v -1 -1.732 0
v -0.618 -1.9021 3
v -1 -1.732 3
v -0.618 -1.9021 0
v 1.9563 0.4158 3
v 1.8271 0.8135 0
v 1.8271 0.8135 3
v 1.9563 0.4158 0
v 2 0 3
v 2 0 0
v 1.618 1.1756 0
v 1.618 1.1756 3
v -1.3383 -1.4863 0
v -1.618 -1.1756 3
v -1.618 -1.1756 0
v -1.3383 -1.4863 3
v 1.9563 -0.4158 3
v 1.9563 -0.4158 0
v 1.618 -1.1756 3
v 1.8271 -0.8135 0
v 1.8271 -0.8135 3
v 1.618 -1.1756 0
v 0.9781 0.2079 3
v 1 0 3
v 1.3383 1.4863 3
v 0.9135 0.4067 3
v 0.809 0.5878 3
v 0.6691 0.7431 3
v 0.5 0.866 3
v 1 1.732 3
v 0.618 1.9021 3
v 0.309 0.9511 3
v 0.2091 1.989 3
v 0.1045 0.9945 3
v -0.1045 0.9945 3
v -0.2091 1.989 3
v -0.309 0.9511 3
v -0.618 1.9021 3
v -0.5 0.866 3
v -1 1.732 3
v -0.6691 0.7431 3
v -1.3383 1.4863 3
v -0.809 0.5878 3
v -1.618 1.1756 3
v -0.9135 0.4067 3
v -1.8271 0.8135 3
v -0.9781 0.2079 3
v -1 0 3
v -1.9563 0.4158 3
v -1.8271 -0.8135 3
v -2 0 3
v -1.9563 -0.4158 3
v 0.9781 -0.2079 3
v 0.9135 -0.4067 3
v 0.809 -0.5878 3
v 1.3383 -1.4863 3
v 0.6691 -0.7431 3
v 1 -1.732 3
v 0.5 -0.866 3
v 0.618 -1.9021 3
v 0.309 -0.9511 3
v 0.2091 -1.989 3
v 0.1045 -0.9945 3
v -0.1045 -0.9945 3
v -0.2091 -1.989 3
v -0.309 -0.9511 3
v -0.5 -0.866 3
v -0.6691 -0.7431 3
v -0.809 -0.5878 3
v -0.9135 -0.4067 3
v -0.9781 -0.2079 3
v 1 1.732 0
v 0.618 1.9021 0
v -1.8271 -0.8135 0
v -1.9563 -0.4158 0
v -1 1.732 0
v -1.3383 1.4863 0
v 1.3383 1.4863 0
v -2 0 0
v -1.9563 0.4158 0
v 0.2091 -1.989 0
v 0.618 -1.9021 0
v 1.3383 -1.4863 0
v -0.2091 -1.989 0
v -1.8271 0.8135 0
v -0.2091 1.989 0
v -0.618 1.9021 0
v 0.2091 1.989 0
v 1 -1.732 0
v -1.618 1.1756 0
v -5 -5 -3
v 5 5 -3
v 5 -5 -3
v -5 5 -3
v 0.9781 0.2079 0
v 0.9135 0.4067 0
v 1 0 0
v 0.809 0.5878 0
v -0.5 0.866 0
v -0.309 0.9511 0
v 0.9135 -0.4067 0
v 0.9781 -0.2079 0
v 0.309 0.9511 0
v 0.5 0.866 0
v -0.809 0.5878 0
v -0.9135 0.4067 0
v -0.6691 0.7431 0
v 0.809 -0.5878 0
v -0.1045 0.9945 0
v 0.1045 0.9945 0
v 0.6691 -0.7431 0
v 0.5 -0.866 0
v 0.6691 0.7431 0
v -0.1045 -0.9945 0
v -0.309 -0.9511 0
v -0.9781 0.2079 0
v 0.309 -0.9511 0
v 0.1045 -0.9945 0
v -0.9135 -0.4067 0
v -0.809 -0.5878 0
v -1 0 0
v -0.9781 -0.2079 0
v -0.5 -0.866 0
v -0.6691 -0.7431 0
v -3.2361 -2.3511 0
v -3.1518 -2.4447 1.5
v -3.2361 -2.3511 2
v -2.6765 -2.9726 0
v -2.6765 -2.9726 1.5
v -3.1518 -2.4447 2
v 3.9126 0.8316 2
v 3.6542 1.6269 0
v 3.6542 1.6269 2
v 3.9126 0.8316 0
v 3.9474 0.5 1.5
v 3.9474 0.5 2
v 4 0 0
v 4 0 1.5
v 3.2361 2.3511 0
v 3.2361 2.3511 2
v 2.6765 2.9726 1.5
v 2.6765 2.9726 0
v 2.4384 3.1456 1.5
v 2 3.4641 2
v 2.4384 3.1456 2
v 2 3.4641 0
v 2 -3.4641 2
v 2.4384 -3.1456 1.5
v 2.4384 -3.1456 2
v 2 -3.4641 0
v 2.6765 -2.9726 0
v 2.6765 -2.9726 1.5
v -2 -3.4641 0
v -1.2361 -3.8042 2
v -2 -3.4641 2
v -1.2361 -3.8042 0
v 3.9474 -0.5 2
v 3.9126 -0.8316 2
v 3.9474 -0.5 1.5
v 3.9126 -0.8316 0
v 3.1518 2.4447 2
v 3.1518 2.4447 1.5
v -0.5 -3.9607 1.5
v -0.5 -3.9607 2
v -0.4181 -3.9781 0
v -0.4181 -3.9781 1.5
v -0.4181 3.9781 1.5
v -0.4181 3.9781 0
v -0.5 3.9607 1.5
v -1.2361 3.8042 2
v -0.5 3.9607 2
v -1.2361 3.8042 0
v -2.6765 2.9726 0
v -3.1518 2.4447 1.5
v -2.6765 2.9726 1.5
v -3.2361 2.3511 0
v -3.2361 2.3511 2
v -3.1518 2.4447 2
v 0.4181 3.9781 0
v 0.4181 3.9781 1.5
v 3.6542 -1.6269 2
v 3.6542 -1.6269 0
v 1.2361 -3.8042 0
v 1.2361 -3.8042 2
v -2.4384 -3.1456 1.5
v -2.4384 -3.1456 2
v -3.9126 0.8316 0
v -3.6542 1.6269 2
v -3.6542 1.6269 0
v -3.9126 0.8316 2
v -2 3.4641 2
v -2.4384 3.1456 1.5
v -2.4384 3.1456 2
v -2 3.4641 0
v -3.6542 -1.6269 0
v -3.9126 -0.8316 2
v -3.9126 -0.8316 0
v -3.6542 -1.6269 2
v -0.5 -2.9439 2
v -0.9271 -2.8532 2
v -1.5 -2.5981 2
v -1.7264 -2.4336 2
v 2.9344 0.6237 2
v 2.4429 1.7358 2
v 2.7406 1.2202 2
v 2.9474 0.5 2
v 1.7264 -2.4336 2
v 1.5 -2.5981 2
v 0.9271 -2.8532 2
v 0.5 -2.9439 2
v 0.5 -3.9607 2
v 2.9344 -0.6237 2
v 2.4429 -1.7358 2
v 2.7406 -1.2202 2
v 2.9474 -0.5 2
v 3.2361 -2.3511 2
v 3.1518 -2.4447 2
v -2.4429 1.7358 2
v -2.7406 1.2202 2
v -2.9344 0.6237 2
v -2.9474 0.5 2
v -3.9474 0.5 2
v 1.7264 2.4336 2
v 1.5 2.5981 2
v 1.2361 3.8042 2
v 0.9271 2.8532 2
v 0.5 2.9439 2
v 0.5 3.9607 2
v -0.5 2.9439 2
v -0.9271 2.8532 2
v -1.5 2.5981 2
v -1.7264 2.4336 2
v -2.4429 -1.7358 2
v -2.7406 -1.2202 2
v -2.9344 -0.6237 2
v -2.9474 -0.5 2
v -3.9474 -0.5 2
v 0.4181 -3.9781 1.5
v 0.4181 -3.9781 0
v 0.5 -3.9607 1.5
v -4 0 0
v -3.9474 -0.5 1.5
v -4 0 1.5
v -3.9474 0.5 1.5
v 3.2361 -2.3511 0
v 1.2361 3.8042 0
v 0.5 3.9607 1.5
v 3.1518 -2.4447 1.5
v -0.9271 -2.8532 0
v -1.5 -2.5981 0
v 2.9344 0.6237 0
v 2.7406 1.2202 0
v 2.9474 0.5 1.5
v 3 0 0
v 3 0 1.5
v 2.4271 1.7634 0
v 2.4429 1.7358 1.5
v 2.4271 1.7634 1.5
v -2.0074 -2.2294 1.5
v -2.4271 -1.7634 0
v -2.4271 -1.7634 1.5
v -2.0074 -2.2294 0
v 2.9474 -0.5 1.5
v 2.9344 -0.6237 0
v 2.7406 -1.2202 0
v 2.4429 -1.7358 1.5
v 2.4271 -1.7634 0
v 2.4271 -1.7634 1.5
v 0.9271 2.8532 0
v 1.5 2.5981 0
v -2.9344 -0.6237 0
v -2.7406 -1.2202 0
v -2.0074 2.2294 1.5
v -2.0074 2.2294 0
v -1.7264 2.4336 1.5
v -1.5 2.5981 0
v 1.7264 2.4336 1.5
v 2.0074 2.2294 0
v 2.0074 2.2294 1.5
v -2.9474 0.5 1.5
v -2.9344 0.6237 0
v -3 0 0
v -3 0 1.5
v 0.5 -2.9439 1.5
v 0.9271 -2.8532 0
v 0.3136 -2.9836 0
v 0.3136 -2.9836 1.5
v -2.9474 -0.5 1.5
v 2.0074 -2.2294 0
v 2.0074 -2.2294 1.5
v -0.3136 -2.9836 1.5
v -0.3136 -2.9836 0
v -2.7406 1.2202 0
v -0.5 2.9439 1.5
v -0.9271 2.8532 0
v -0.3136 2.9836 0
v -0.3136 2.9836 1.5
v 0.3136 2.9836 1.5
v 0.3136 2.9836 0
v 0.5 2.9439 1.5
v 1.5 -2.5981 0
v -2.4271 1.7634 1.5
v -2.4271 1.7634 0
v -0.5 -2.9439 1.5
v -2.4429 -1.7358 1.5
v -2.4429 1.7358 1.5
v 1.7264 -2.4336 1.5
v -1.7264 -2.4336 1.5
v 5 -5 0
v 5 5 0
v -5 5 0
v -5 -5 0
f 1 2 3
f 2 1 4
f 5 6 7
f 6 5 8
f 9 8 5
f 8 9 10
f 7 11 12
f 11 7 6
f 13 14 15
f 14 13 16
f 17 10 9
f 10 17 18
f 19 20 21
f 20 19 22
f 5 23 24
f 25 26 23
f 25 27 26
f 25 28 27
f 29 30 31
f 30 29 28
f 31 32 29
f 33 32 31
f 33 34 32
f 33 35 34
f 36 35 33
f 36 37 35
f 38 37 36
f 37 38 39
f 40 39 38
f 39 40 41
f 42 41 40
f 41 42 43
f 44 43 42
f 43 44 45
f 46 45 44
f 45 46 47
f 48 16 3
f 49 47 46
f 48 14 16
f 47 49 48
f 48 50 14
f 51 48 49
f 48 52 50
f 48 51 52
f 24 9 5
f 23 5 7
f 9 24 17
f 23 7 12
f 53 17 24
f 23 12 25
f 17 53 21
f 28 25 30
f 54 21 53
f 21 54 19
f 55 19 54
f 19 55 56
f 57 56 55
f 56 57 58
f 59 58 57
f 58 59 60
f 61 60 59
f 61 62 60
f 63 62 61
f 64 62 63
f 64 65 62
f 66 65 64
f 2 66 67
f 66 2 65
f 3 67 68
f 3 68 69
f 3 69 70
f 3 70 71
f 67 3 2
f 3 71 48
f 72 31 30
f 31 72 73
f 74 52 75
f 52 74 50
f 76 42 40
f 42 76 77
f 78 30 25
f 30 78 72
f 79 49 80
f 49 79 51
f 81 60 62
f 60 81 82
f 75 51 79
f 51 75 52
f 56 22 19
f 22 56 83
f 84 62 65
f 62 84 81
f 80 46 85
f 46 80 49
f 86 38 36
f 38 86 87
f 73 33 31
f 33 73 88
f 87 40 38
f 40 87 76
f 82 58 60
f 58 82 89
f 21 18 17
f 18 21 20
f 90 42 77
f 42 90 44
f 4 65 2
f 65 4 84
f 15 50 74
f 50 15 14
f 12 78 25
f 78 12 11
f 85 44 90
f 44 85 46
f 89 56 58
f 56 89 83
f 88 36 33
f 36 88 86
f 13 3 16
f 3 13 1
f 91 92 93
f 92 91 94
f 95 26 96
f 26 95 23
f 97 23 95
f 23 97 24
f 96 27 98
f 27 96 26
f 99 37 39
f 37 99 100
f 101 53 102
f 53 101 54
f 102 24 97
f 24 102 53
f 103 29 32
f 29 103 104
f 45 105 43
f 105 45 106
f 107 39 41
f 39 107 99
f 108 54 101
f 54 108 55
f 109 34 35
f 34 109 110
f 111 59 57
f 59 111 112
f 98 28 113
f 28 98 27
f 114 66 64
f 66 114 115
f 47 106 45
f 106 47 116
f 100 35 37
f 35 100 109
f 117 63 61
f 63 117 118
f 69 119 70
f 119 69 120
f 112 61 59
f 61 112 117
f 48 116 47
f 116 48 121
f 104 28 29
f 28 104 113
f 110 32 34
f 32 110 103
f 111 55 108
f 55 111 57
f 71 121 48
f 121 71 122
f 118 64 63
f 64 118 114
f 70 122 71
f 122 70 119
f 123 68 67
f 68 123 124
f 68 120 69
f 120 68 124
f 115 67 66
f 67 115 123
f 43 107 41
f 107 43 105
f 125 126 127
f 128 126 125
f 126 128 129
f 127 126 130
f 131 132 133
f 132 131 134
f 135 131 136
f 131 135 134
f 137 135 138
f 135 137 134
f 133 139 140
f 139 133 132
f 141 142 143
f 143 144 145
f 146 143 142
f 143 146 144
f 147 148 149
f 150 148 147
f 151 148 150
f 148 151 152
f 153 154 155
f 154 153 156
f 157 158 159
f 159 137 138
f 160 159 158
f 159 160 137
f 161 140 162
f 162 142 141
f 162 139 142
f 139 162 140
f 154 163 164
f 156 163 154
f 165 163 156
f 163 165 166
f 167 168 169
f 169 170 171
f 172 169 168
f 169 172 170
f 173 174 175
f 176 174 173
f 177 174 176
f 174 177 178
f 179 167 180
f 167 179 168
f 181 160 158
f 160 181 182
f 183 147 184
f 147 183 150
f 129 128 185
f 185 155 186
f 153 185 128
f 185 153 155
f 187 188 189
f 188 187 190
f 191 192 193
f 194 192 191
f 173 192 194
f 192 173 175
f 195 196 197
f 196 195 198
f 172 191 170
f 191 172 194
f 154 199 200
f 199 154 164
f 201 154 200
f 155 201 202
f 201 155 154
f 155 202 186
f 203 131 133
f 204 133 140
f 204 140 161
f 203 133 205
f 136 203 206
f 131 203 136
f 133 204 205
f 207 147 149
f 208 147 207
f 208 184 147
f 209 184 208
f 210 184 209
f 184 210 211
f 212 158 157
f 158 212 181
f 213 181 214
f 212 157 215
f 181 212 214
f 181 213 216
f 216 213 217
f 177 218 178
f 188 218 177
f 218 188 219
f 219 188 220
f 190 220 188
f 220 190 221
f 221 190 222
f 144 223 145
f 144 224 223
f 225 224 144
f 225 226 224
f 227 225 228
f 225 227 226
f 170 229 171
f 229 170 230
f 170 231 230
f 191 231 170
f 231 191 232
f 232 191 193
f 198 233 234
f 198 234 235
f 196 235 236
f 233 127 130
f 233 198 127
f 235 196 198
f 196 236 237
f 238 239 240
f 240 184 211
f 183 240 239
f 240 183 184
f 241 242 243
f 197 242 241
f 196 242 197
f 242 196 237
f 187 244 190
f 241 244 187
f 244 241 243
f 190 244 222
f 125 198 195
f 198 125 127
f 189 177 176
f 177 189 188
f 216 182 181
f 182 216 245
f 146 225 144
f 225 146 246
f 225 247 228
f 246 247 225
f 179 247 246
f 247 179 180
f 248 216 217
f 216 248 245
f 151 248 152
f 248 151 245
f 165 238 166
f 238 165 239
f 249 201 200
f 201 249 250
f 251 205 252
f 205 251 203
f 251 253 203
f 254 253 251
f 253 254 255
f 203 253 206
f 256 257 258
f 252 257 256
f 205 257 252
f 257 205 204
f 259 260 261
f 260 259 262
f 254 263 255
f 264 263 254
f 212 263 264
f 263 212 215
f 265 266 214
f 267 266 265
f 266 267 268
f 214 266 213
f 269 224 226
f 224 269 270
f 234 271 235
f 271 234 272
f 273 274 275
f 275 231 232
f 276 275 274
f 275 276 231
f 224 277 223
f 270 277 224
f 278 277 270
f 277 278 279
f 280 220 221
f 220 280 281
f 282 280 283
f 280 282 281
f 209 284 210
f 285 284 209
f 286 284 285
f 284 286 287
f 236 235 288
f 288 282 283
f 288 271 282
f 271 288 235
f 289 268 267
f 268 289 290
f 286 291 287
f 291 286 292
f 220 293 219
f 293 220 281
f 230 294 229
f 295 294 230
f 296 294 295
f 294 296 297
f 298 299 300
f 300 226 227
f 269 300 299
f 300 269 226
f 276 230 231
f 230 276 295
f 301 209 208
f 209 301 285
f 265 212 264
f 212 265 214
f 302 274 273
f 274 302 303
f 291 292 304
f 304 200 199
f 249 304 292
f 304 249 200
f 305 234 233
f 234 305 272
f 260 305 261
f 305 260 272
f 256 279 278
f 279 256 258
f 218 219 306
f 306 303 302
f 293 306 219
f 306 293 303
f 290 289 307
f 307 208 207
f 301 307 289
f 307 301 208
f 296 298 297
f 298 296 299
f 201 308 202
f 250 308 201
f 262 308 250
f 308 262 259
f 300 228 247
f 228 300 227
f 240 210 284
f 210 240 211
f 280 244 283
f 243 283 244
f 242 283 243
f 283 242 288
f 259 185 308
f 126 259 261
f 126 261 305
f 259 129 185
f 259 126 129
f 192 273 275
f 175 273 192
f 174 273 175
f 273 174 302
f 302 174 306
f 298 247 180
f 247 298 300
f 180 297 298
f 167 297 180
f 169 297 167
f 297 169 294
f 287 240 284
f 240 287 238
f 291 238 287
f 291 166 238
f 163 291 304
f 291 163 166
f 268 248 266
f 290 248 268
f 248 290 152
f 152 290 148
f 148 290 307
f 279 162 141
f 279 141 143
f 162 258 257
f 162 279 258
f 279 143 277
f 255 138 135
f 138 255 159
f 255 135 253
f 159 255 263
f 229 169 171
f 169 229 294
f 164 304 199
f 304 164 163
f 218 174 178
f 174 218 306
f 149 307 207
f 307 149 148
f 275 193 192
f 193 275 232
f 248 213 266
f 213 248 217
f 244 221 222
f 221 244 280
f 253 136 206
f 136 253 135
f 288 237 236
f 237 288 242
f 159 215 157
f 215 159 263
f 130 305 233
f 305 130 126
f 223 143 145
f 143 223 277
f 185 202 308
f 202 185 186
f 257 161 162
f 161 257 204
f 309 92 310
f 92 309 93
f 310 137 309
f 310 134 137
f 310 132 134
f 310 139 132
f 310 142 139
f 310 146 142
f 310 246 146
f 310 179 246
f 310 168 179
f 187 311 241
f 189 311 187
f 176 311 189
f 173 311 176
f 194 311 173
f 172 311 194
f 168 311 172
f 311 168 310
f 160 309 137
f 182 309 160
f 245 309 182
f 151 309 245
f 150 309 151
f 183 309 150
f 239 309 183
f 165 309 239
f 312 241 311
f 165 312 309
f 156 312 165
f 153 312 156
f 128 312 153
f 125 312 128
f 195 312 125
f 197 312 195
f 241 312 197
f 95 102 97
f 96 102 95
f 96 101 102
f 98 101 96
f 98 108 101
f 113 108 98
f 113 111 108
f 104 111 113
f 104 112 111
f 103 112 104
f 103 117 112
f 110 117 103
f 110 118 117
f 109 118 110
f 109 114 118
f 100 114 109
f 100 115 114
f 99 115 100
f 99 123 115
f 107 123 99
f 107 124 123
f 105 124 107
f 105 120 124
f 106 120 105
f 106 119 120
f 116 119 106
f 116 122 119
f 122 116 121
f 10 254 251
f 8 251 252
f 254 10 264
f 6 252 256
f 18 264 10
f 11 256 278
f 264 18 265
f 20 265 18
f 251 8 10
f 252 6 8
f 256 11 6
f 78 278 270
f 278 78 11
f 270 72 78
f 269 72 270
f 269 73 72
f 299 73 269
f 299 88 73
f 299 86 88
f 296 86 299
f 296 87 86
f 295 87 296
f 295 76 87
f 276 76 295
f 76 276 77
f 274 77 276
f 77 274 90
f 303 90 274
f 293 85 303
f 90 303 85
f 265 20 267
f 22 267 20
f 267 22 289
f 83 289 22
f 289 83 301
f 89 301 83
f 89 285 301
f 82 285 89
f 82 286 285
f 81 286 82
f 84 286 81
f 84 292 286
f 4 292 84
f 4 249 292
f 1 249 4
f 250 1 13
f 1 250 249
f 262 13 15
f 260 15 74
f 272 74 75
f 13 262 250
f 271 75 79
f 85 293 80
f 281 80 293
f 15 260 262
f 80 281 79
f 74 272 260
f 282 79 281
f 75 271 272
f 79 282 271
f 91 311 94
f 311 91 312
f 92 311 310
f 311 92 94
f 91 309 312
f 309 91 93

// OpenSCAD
union() {
translate([0, 0, -1.5])
cube(size = [10, 10, 3], center = true);

difference() {
cylinder(h = 6, r1 = 2, r2 = 2, center = true, $fn = 30);
cylinder(h = 8, r1 = 1, r2 = 1, center = true, $fn = 30);
}

difference() {
difference() {
cylinder(h = 4, r1 = 4, r2 = 4, center = true, $fn = 30);
cylinder(h = 8, r1 = 3, r2 = 3, center = true, $fn = 30);
}

translate([0, 0, 2])
union() {
cube(size = [1, 10, 1], center = true);

rotate([0, 0, 45])
cube(size = [1, 10, 1], center = true);

rotate([0, 0, 90])
cube(size = [1, 10, 1], center = true);

rotate([0, 0, 135])
cube(size = [1, 10, 1], center = true);
}

}
  
}
